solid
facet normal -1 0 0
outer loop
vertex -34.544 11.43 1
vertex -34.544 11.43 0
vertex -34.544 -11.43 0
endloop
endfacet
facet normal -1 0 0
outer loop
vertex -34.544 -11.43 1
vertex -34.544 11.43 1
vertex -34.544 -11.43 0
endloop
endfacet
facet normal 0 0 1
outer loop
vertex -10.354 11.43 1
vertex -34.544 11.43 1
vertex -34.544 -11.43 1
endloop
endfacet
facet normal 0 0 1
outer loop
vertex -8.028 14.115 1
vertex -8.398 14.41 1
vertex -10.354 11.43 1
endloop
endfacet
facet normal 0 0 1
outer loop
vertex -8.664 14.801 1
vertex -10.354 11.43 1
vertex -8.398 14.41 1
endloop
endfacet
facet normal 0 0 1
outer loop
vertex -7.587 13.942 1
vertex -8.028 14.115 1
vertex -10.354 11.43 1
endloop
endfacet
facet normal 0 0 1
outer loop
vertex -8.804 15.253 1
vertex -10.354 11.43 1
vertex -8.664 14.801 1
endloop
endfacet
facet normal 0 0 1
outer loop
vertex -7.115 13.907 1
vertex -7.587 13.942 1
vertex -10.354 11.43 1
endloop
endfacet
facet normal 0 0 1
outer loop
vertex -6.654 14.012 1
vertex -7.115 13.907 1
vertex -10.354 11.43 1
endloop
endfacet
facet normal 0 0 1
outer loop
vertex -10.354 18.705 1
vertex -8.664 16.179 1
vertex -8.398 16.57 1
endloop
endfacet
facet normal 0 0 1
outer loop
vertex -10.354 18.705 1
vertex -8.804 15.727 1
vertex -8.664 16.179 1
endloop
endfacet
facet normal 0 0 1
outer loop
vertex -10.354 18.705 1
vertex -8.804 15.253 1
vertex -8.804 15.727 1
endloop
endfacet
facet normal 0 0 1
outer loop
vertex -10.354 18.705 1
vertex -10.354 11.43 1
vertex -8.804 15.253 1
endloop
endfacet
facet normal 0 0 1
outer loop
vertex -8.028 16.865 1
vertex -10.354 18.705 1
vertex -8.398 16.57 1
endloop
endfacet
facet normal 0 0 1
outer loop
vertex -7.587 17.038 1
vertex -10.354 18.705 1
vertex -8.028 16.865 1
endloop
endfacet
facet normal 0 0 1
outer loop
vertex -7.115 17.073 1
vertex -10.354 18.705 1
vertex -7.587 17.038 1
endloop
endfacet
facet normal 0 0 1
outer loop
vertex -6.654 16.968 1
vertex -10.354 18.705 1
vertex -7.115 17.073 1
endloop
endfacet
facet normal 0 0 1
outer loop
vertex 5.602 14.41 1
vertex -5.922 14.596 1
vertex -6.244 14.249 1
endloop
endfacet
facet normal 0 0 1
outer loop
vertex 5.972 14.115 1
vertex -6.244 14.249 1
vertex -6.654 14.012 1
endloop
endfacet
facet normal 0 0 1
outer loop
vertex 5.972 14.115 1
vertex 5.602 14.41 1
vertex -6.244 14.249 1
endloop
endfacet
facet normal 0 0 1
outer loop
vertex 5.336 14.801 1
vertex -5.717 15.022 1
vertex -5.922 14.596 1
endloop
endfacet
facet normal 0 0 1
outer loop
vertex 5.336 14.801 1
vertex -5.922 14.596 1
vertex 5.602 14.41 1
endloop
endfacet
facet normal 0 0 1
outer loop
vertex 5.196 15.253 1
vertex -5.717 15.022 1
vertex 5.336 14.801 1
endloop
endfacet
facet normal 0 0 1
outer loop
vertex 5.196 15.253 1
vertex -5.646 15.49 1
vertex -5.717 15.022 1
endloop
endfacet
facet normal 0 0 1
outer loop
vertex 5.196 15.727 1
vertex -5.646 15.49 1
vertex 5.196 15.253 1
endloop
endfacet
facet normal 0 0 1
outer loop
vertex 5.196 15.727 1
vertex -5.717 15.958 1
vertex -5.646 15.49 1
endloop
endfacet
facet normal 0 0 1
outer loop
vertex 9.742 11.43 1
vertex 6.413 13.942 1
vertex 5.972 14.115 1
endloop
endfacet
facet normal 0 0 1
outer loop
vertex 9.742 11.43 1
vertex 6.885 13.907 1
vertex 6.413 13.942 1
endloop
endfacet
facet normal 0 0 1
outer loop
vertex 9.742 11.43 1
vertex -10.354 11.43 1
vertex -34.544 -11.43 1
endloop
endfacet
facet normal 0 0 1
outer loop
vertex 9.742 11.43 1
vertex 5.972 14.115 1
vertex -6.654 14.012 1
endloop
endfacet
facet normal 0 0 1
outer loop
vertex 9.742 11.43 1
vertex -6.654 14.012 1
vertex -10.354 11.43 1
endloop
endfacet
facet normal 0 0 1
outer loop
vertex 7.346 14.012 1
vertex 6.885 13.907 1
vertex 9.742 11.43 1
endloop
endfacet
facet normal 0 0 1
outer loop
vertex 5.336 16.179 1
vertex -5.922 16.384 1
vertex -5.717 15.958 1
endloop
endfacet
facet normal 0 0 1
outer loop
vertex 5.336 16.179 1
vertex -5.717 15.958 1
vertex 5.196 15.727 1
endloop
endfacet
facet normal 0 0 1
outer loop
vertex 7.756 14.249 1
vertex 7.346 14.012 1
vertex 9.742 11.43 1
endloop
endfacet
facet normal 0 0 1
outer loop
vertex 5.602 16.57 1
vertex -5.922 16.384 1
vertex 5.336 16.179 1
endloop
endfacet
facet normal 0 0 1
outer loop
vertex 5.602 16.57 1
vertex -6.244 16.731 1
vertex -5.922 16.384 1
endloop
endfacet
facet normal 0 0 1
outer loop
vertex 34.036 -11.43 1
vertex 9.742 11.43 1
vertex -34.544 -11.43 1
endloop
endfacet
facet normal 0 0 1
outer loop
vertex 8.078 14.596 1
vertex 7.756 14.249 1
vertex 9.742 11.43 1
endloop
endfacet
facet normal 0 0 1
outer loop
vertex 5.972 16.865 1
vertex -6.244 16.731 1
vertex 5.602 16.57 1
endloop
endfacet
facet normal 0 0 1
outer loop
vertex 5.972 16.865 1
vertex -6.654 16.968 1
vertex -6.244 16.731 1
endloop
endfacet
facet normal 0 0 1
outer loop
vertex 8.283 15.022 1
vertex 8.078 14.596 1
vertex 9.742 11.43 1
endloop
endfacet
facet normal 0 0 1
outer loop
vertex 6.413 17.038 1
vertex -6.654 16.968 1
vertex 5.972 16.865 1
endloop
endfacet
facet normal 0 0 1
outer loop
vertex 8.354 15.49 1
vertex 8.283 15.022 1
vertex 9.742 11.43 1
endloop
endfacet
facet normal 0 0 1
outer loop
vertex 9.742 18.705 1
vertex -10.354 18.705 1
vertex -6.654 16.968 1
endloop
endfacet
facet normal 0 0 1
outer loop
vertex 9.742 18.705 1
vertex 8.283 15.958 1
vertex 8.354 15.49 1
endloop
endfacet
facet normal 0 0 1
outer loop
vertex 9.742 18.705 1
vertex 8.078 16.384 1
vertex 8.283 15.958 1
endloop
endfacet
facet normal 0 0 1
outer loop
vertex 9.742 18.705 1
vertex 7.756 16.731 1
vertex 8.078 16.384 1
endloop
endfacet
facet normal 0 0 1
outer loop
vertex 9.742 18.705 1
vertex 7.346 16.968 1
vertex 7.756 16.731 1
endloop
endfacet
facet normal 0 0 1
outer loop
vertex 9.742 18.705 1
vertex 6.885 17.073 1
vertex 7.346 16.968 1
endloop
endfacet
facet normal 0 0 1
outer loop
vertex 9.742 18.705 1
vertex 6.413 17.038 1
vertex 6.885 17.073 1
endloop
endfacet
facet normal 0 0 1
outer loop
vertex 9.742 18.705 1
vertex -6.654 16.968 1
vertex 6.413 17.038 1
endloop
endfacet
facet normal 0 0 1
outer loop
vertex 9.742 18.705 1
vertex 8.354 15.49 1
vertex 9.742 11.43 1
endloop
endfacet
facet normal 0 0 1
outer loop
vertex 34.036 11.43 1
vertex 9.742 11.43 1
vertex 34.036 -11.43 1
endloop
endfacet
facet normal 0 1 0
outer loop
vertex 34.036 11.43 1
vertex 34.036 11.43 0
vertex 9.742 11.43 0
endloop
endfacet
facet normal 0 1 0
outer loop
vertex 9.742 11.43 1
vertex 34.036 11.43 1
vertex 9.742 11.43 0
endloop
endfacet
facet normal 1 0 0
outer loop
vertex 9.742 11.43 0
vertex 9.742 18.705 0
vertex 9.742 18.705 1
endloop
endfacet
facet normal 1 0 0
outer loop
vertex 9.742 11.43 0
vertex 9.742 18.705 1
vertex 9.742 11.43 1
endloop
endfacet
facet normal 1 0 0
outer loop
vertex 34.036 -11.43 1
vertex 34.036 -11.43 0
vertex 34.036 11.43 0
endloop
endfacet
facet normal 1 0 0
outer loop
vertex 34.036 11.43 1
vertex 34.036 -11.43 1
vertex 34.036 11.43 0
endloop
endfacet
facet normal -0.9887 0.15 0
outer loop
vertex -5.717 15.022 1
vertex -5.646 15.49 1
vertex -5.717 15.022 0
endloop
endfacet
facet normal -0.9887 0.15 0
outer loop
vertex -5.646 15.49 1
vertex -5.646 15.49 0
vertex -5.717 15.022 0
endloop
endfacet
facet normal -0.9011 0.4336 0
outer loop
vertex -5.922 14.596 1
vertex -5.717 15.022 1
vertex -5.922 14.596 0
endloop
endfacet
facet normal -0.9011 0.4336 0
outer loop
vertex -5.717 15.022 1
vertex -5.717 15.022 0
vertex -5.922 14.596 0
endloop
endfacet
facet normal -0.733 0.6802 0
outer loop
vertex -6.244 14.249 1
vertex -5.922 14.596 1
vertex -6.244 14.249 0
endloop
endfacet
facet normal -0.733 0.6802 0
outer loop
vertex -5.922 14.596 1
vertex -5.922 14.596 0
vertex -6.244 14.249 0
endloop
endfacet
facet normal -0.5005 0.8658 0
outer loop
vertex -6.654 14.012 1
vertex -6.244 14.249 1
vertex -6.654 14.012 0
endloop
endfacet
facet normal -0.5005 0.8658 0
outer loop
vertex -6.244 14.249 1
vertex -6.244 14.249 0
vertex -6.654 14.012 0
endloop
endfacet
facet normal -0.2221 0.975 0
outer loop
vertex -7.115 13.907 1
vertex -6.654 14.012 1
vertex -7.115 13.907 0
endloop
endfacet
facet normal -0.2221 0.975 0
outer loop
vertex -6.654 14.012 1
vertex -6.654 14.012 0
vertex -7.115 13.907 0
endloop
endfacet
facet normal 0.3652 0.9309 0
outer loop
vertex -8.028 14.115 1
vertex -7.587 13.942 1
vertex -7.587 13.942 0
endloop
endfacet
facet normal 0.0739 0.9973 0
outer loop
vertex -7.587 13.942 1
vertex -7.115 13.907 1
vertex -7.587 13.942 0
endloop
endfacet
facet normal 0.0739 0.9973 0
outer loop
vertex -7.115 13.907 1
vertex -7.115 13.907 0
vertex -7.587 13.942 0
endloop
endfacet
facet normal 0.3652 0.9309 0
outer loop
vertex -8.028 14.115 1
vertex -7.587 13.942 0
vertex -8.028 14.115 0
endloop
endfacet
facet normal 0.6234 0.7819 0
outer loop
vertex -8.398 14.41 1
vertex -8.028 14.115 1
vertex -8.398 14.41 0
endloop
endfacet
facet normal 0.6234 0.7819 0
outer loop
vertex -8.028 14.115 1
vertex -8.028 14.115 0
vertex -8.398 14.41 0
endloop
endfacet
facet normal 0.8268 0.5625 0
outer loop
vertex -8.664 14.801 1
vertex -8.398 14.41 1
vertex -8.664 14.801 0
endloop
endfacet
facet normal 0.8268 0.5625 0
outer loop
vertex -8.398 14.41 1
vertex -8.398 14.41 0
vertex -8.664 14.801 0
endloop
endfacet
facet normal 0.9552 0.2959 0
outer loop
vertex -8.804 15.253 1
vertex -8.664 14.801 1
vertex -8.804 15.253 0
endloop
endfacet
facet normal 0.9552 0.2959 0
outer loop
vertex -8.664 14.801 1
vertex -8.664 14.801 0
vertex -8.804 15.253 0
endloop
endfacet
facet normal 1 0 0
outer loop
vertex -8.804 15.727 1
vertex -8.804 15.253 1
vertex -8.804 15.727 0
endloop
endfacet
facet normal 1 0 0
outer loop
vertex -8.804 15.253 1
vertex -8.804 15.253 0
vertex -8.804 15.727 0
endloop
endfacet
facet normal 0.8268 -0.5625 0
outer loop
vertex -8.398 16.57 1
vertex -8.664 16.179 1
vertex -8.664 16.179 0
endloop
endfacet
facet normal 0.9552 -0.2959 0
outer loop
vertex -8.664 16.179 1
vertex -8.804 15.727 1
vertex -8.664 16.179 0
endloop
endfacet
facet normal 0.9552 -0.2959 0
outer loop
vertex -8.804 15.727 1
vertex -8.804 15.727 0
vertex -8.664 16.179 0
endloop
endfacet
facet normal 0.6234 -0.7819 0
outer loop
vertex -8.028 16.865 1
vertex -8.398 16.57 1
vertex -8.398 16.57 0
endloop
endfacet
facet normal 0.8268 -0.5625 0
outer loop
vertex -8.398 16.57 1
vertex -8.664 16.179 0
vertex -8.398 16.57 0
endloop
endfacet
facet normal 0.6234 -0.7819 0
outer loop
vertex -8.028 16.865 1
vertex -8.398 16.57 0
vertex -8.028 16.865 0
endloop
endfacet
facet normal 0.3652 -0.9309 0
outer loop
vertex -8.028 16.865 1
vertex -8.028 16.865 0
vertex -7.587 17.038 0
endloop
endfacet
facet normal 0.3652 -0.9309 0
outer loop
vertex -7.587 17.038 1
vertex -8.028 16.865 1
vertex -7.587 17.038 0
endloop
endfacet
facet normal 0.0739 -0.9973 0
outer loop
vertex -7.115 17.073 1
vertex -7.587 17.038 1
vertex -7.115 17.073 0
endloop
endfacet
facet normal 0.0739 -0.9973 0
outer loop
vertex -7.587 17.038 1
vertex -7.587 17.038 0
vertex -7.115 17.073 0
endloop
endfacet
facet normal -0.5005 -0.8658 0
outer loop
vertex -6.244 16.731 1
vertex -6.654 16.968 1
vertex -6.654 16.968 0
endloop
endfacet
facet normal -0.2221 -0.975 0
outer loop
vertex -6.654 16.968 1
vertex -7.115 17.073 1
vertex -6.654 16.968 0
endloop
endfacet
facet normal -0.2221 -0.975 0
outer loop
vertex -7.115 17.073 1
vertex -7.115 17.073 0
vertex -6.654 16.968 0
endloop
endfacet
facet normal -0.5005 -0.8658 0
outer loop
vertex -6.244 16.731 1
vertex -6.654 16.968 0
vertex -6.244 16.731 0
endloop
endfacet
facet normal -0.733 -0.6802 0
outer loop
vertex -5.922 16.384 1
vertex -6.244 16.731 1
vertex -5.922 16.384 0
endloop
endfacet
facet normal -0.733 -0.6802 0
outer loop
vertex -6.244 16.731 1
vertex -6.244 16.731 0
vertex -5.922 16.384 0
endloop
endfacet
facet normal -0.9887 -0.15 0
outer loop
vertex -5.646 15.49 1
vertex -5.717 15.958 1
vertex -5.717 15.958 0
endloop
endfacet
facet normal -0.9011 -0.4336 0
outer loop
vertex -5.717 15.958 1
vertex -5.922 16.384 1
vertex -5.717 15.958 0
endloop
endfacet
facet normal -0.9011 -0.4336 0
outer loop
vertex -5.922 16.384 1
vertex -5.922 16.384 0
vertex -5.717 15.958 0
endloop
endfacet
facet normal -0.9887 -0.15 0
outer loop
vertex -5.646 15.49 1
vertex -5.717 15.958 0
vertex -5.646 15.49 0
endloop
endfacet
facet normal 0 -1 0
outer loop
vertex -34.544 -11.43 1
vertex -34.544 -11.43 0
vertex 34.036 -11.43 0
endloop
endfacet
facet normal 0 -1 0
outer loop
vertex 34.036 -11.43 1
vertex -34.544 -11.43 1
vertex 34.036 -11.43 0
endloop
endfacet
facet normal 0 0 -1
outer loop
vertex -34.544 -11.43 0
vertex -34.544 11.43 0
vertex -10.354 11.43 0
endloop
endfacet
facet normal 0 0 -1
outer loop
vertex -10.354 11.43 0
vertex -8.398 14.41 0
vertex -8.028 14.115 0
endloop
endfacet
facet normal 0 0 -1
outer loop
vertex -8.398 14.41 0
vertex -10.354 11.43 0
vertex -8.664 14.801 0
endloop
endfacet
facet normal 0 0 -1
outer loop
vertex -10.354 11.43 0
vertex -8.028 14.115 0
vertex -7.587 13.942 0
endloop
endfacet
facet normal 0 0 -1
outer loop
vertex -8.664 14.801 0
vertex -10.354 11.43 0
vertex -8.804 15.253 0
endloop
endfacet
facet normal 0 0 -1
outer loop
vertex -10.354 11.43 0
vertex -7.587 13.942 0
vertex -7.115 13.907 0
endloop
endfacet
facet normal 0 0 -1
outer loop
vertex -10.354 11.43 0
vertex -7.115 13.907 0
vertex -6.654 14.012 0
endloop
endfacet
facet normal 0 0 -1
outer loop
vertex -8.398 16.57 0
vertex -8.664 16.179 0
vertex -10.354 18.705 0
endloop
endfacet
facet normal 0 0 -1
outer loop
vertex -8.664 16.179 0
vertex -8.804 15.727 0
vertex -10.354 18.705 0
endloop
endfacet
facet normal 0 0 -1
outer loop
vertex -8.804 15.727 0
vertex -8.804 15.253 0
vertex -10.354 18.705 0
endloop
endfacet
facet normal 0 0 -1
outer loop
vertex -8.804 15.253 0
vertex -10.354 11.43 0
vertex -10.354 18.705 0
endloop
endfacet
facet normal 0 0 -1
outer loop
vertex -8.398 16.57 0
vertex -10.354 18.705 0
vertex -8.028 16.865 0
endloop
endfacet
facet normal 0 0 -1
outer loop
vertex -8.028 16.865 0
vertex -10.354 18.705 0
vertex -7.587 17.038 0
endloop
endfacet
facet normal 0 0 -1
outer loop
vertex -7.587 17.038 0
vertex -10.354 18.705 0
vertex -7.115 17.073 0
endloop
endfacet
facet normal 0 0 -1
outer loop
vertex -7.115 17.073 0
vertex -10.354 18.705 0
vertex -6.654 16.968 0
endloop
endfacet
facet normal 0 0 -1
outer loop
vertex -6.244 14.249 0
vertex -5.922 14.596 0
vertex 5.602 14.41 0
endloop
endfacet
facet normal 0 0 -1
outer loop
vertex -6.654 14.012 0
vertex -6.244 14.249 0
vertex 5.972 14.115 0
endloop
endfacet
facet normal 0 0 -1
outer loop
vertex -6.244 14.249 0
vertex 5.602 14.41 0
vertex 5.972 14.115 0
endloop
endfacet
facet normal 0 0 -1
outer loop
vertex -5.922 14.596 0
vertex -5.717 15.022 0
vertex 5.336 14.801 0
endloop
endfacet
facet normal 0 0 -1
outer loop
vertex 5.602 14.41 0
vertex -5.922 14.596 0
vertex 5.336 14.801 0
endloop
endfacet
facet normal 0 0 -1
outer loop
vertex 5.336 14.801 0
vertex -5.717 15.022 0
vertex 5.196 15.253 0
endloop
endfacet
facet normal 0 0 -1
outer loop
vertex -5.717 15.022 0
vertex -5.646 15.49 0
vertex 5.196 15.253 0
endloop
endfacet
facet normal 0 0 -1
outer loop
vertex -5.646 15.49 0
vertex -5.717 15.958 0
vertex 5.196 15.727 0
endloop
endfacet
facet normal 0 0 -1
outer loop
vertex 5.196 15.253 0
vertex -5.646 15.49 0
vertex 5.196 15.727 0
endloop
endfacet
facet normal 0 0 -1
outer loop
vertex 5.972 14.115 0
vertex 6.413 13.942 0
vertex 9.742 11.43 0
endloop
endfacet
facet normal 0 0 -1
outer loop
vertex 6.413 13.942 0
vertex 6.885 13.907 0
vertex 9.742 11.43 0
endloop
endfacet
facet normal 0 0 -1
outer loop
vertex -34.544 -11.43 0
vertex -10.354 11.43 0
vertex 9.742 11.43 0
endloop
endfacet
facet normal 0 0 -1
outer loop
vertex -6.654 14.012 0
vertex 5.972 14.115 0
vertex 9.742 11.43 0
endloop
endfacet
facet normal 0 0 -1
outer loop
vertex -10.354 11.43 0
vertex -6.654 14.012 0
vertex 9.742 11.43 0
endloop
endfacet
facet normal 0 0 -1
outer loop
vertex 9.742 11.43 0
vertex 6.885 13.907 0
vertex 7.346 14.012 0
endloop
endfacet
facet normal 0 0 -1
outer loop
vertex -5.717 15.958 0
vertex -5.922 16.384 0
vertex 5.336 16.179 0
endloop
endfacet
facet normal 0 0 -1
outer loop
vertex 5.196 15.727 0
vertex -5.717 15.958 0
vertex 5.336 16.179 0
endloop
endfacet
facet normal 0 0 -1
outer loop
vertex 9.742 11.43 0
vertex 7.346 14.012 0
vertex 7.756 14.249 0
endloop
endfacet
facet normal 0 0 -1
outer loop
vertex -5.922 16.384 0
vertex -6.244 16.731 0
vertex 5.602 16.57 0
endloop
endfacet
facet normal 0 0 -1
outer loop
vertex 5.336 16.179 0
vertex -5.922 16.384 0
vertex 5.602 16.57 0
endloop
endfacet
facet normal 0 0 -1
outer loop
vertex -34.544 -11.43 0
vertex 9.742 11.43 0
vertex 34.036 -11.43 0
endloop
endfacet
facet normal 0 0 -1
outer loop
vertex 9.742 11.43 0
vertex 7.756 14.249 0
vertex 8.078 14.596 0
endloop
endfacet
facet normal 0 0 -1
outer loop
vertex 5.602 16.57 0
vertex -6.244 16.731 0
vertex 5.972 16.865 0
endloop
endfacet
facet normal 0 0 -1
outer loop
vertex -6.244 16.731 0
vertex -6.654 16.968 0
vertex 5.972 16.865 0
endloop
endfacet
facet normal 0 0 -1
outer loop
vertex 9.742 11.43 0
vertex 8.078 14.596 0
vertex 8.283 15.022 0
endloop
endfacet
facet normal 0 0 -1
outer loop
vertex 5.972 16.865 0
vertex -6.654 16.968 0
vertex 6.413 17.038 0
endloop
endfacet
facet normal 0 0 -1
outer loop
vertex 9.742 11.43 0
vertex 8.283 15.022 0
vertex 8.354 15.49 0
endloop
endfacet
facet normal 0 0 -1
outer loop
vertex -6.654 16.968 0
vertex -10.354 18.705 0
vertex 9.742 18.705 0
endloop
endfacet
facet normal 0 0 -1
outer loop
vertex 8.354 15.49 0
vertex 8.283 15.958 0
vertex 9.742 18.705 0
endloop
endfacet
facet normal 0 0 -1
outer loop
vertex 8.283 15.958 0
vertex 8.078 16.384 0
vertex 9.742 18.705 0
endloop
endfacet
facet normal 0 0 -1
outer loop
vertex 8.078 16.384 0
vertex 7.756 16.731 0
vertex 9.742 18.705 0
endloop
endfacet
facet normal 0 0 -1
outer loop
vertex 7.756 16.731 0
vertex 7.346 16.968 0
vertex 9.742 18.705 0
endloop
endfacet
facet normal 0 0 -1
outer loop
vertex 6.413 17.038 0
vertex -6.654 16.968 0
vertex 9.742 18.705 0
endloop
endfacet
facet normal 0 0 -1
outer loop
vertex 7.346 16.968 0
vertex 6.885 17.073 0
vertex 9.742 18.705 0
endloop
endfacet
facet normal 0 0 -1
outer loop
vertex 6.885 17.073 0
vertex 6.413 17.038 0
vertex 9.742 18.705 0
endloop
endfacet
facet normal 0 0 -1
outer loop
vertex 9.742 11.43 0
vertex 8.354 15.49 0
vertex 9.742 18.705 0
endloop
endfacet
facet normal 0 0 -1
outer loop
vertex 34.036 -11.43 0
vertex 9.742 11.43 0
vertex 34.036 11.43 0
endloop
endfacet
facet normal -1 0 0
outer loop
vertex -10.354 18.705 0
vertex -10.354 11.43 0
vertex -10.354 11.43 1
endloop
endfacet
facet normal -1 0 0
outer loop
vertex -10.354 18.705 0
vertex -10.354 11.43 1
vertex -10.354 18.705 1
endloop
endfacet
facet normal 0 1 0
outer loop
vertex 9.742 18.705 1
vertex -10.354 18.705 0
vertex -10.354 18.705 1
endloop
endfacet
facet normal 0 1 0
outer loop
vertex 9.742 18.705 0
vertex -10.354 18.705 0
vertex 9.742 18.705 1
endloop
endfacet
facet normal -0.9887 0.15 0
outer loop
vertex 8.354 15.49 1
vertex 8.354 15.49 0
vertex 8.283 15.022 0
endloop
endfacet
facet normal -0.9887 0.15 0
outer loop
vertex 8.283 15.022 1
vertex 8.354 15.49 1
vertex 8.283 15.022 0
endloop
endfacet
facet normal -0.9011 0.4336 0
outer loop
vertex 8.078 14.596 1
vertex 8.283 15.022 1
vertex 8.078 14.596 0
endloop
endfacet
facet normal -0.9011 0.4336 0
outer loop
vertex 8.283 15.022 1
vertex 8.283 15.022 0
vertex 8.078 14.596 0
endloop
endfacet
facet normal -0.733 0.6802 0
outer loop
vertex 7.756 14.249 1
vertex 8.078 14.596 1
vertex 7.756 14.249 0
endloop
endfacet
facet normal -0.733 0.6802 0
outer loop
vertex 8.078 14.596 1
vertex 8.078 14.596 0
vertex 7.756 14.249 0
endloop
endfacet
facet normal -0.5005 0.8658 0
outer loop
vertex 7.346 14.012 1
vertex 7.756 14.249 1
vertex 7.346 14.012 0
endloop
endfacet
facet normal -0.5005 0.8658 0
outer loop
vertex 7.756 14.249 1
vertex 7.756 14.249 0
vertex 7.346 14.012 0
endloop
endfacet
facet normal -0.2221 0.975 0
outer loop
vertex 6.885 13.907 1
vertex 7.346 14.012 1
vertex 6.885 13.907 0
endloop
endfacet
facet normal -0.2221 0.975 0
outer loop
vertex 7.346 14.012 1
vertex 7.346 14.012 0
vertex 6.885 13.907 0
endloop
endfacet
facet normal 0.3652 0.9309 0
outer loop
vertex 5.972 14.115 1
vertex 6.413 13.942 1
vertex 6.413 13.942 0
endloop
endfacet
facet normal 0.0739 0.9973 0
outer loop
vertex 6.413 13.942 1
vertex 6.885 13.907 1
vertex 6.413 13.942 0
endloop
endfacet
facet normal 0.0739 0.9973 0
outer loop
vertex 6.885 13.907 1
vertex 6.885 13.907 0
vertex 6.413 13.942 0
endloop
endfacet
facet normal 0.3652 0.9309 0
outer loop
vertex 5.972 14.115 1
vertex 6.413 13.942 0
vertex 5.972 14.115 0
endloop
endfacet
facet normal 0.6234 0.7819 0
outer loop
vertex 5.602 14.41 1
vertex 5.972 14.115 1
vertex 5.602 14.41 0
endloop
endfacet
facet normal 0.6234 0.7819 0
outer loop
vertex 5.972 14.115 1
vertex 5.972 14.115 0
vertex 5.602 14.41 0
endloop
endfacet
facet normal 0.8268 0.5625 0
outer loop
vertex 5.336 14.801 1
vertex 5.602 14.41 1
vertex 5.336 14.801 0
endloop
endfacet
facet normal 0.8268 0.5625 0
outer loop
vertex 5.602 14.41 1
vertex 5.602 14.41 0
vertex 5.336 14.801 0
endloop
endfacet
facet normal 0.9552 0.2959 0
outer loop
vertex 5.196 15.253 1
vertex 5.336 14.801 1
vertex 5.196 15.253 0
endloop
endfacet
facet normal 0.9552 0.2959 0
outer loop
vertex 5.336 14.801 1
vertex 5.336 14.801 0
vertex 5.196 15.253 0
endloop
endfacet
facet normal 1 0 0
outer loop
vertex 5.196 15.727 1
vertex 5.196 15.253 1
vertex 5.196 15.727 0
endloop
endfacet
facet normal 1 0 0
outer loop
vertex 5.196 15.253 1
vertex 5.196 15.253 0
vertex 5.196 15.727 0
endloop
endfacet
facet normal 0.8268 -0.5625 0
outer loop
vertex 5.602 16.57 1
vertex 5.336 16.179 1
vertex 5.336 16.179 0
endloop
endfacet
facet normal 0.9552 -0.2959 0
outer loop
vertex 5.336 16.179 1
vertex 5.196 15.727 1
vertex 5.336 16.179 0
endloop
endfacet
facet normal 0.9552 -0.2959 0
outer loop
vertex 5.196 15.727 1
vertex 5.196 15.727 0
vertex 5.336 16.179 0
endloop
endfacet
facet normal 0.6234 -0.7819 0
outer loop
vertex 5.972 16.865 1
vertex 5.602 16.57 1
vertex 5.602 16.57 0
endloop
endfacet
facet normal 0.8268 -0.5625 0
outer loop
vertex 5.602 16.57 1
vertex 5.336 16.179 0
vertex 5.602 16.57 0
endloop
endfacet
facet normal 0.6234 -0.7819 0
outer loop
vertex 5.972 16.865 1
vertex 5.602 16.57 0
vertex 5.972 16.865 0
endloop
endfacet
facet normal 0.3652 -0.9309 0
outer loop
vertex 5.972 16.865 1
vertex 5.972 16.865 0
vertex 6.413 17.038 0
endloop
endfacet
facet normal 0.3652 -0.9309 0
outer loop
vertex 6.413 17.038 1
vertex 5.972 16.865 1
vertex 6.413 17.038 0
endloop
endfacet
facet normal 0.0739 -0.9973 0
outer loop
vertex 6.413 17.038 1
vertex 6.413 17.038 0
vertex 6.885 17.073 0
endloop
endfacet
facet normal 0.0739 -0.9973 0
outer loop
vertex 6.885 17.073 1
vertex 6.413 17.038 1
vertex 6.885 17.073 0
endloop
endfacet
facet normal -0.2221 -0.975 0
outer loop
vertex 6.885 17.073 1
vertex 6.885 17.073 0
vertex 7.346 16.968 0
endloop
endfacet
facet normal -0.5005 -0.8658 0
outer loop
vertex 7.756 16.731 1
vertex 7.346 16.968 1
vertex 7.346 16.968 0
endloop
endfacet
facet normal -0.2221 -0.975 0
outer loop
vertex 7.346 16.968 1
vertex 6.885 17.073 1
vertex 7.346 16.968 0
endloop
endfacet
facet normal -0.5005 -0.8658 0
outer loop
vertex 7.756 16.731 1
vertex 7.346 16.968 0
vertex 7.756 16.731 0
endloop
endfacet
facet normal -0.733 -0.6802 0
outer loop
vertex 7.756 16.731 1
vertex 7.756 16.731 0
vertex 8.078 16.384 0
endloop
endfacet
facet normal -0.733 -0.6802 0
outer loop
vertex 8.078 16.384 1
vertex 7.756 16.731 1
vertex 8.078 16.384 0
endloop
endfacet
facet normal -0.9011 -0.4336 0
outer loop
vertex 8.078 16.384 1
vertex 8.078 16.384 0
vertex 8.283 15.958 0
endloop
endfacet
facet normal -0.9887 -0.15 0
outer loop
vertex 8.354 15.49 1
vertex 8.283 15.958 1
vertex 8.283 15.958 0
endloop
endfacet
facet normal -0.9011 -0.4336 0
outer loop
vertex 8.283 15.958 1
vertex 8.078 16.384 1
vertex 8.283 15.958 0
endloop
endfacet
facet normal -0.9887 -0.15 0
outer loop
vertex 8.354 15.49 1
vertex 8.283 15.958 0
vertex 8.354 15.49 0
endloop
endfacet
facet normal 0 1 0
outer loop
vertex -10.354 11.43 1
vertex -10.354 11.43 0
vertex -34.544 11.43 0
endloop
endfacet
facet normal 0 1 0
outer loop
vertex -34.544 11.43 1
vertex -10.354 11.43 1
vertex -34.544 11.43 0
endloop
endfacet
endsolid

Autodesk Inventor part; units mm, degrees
ref_plane "YZ Plane" through (0, 0, 0) normal (1, 0, 0) x (0, 1, 0)
ref_plane "XZ Plane" through (0, 0, 0) normal (0, 1, 0) x (-1, 0, 0)
ref_plane "XY Plane" through (0, 0, 0) normal (0, 0, 1) x (1, 0, 0)
ref_plane "Work Plane1" through (0, 0, 0) normal (0, 0, 1) x (1, 0, 0)
sketch "Sketch1" plane through (0, 0, 0) normal (0, 0, 1) x (1, 0, 0)
  circle A0 centre (6.766, 15.49) radius 1.5875
  circle A1 centre (-7.234, 15.49) radius 1.5875
  line L0 (-34.544, 11.43) -> (-34.544, -11.43)
  line L1 (-34.544, -11.43) -> (34.036, -11.43)
  line L2 (34.036, -11.43) -> (34.036, 11.43)
  line L3 (-10.3543, 11.43) -> (-10.3543, 18.7046)
  line L4 (-10.3543, 18.7046) -> (9.7417, 18.7046)
  line L5 (9.7417, 18.7046) -> (9.7417, 11.43)
  line L6 (34.036, 11.43) -> (9.7417, 11.43)
  line L7 (-10.3543, 11.43) -> (-34.544, 11.43)
  point P0 (0, 0)
  dimension "d0" = 68.58
  dimension "d1" = 22.86
  dimension "d2" = 27.31
  dimension "d3" = 14
  dimension "d4" = 3.175
  dimension "d5" = 3.175
  dimension "d10" = 26.92
extrude "Extrusion1" add sketch "Sketch1" along normal blind 1
properties part number "Syringe PCB"
